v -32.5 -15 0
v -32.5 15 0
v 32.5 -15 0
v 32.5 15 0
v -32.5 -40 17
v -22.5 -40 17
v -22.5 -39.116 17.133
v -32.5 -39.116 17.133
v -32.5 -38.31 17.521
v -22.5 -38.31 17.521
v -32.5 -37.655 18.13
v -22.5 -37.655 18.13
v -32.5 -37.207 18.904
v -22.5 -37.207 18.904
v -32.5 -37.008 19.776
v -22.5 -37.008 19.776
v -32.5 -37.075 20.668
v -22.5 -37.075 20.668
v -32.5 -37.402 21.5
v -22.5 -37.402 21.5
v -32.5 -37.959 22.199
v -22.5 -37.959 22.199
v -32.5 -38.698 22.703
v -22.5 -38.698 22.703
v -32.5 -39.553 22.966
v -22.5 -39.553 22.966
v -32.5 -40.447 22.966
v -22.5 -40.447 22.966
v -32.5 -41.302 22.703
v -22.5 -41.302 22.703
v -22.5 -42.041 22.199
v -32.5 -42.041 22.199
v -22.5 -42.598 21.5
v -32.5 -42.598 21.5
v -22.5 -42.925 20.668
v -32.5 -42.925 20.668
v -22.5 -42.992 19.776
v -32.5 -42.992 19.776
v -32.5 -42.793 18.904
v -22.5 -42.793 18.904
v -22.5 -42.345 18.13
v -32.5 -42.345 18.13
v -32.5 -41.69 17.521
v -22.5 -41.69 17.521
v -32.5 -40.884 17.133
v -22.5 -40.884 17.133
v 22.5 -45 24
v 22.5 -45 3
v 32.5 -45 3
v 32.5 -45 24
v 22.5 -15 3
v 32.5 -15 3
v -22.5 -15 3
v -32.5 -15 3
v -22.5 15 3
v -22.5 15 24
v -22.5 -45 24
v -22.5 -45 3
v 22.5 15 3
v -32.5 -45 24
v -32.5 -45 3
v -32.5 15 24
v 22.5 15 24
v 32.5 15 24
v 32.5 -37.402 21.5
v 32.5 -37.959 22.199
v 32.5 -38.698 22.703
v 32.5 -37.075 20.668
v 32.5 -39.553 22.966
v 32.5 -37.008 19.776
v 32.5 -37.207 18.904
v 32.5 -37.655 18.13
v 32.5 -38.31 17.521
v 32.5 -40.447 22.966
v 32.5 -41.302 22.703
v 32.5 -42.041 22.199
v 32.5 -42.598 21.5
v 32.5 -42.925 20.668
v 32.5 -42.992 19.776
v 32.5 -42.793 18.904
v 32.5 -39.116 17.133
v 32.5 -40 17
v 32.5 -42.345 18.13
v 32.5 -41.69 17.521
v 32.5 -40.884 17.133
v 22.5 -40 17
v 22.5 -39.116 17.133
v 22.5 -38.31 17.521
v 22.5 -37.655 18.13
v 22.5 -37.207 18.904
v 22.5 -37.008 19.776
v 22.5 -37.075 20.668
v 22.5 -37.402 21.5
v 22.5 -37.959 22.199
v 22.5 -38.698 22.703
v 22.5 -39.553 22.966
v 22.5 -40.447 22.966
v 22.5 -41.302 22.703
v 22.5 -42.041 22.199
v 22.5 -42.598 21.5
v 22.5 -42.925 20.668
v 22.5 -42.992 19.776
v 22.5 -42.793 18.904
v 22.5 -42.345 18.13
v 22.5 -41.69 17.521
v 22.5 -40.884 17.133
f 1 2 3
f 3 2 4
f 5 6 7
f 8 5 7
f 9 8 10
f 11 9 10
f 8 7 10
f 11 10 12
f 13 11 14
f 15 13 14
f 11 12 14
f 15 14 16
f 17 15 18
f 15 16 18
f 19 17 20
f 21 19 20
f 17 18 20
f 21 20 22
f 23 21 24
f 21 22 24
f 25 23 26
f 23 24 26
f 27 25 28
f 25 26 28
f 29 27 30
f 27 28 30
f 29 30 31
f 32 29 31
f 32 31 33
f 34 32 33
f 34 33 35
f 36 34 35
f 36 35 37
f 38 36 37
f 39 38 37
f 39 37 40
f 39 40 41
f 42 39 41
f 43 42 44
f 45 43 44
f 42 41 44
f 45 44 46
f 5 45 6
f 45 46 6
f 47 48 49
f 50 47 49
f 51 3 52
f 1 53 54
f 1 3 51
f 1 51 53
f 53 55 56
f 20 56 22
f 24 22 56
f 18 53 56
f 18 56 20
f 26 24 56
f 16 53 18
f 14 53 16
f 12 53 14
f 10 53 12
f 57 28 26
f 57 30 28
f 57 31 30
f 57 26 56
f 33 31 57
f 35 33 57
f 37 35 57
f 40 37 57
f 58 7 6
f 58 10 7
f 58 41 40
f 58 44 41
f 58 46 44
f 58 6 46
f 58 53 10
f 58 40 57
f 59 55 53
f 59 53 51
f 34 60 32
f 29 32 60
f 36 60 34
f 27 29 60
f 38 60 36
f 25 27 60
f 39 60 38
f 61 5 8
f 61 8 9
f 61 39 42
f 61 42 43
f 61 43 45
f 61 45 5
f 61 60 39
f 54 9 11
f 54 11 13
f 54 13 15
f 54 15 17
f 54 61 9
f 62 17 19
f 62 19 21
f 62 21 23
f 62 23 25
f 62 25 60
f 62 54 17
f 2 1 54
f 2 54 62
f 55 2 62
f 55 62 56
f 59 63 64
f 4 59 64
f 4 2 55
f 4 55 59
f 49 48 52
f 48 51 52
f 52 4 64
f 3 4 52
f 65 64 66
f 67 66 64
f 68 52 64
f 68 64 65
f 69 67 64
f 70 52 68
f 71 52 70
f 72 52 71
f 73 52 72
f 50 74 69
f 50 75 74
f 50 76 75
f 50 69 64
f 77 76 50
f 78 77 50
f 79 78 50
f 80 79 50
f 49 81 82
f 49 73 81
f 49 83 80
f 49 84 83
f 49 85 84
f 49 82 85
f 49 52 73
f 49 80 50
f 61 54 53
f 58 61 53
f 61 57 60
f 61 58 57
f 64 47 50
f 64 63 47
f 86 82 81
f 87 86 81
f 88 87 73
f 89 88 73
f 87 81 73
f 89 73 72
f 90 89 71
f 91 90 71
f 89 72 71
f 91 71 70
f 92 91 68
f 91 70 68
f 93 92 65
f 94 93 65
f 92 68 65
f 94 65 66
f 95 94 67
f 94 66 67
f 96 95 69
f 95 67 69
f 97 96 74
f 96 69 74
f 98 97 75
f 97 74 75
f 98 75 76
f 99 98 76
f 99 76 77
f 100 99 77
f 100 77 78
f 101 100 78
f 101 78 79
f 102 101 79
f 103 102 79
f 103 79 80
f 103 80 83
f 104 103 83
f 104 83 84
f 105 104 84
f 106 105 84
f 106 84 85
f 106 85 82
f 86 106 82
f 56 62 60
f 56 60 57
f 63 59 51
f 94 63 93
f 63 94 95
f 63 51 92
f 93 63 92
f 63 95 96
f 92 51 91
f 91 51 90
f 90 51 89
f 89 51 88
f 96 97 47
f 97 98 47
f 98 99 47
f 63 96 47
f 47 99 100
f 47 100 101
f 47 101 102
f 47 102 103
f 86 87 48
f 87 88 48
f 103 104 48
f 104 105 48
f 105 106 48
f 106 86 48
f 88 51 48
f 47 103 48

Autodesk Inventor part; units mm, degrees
ref_plane "YZ Plane" through (0, 0, 0) normal (1, 0, 0) x (0, 1, 0)
ref_plane "XZ Plane" through (0, 0, 0) normal (0, 1, 0) x (-1, 0, 0)
ref_plane "XY Plane" through (0, 0, 0) normal (0, 0, 1) x (1, 0, 0)
sketch "スケッチ1" plane through (0, 0, 0) normal (0, 0, 1) x (1, 0, 0)
  line L0 (-32.5, 15) -> (32.5, 15)
  line L1 (32.5, 15) -> (32.5, -15)
  line L2 (32.5, -15) -> (-32.5, -15)
  line L3 (-32.5, -15) -> (-32.5, 15)
  line L4 (-45.5, 0) -> (45.5, 0) projected
  line L5 (0, 21) -> (0, -21) projected
  point P0 (0, 0)
  dimension "d0" = 30
  dimension "d1" = 65
extrude "押し出し1" add sketch "スケッチ1" along normal blind 3
sketch "スケッチ2" plane through (0, 0, 3) normal (0, 0, 1) x (1, 0, 0)
  line L0 (32.5, 15) -> (-32.5, 15) projected
  line L1 (-32.5, 15) -> (-22.5, 15)
  line L2 (-22.5, 15) -> (-22.5, -45)
  line L3 (-22.5, -45) -> (-32.5, -45)
  line L4 (-32.5, -45) -> (-32.5, 15)
  line L5 (32.5, -15) -> (32.5, 15) projected
  line L6 (32.5, 15) -> (22.5, 15)
  line L7 (22.5, 15) -> (22.5, -45)
  line L8 (22.5, -45) -> (32.5, -45)
  line L9 (32.5, -45) -> (32.5, 15)
  point P0 (0, 0)
  dimension "d4" = 60
  dimension "d5" = 10
extrude "押し出し2" add sketch "スケッチ2" along normal blind 21
sketch "スケッチ3" plane through (32.5, -15, 0) normal (1, 0, 0) x (0, 0, -1)
  circle A0 centre (-20, -25) radius 3
  line L0 (-24, -30) -> (-24, 30) projected
  line L1 (-3, -30) -> (-24, -30) projected
  point P0 (0, 15)
  dimension "d8" = 4
  dimension "d9" = 5
  dimension "d10" = 6
extrude "押し出し3" cut sketch "スケッチ3" against normal up to surface (65 mm away)
properties part number "vacuum_cup_base"
